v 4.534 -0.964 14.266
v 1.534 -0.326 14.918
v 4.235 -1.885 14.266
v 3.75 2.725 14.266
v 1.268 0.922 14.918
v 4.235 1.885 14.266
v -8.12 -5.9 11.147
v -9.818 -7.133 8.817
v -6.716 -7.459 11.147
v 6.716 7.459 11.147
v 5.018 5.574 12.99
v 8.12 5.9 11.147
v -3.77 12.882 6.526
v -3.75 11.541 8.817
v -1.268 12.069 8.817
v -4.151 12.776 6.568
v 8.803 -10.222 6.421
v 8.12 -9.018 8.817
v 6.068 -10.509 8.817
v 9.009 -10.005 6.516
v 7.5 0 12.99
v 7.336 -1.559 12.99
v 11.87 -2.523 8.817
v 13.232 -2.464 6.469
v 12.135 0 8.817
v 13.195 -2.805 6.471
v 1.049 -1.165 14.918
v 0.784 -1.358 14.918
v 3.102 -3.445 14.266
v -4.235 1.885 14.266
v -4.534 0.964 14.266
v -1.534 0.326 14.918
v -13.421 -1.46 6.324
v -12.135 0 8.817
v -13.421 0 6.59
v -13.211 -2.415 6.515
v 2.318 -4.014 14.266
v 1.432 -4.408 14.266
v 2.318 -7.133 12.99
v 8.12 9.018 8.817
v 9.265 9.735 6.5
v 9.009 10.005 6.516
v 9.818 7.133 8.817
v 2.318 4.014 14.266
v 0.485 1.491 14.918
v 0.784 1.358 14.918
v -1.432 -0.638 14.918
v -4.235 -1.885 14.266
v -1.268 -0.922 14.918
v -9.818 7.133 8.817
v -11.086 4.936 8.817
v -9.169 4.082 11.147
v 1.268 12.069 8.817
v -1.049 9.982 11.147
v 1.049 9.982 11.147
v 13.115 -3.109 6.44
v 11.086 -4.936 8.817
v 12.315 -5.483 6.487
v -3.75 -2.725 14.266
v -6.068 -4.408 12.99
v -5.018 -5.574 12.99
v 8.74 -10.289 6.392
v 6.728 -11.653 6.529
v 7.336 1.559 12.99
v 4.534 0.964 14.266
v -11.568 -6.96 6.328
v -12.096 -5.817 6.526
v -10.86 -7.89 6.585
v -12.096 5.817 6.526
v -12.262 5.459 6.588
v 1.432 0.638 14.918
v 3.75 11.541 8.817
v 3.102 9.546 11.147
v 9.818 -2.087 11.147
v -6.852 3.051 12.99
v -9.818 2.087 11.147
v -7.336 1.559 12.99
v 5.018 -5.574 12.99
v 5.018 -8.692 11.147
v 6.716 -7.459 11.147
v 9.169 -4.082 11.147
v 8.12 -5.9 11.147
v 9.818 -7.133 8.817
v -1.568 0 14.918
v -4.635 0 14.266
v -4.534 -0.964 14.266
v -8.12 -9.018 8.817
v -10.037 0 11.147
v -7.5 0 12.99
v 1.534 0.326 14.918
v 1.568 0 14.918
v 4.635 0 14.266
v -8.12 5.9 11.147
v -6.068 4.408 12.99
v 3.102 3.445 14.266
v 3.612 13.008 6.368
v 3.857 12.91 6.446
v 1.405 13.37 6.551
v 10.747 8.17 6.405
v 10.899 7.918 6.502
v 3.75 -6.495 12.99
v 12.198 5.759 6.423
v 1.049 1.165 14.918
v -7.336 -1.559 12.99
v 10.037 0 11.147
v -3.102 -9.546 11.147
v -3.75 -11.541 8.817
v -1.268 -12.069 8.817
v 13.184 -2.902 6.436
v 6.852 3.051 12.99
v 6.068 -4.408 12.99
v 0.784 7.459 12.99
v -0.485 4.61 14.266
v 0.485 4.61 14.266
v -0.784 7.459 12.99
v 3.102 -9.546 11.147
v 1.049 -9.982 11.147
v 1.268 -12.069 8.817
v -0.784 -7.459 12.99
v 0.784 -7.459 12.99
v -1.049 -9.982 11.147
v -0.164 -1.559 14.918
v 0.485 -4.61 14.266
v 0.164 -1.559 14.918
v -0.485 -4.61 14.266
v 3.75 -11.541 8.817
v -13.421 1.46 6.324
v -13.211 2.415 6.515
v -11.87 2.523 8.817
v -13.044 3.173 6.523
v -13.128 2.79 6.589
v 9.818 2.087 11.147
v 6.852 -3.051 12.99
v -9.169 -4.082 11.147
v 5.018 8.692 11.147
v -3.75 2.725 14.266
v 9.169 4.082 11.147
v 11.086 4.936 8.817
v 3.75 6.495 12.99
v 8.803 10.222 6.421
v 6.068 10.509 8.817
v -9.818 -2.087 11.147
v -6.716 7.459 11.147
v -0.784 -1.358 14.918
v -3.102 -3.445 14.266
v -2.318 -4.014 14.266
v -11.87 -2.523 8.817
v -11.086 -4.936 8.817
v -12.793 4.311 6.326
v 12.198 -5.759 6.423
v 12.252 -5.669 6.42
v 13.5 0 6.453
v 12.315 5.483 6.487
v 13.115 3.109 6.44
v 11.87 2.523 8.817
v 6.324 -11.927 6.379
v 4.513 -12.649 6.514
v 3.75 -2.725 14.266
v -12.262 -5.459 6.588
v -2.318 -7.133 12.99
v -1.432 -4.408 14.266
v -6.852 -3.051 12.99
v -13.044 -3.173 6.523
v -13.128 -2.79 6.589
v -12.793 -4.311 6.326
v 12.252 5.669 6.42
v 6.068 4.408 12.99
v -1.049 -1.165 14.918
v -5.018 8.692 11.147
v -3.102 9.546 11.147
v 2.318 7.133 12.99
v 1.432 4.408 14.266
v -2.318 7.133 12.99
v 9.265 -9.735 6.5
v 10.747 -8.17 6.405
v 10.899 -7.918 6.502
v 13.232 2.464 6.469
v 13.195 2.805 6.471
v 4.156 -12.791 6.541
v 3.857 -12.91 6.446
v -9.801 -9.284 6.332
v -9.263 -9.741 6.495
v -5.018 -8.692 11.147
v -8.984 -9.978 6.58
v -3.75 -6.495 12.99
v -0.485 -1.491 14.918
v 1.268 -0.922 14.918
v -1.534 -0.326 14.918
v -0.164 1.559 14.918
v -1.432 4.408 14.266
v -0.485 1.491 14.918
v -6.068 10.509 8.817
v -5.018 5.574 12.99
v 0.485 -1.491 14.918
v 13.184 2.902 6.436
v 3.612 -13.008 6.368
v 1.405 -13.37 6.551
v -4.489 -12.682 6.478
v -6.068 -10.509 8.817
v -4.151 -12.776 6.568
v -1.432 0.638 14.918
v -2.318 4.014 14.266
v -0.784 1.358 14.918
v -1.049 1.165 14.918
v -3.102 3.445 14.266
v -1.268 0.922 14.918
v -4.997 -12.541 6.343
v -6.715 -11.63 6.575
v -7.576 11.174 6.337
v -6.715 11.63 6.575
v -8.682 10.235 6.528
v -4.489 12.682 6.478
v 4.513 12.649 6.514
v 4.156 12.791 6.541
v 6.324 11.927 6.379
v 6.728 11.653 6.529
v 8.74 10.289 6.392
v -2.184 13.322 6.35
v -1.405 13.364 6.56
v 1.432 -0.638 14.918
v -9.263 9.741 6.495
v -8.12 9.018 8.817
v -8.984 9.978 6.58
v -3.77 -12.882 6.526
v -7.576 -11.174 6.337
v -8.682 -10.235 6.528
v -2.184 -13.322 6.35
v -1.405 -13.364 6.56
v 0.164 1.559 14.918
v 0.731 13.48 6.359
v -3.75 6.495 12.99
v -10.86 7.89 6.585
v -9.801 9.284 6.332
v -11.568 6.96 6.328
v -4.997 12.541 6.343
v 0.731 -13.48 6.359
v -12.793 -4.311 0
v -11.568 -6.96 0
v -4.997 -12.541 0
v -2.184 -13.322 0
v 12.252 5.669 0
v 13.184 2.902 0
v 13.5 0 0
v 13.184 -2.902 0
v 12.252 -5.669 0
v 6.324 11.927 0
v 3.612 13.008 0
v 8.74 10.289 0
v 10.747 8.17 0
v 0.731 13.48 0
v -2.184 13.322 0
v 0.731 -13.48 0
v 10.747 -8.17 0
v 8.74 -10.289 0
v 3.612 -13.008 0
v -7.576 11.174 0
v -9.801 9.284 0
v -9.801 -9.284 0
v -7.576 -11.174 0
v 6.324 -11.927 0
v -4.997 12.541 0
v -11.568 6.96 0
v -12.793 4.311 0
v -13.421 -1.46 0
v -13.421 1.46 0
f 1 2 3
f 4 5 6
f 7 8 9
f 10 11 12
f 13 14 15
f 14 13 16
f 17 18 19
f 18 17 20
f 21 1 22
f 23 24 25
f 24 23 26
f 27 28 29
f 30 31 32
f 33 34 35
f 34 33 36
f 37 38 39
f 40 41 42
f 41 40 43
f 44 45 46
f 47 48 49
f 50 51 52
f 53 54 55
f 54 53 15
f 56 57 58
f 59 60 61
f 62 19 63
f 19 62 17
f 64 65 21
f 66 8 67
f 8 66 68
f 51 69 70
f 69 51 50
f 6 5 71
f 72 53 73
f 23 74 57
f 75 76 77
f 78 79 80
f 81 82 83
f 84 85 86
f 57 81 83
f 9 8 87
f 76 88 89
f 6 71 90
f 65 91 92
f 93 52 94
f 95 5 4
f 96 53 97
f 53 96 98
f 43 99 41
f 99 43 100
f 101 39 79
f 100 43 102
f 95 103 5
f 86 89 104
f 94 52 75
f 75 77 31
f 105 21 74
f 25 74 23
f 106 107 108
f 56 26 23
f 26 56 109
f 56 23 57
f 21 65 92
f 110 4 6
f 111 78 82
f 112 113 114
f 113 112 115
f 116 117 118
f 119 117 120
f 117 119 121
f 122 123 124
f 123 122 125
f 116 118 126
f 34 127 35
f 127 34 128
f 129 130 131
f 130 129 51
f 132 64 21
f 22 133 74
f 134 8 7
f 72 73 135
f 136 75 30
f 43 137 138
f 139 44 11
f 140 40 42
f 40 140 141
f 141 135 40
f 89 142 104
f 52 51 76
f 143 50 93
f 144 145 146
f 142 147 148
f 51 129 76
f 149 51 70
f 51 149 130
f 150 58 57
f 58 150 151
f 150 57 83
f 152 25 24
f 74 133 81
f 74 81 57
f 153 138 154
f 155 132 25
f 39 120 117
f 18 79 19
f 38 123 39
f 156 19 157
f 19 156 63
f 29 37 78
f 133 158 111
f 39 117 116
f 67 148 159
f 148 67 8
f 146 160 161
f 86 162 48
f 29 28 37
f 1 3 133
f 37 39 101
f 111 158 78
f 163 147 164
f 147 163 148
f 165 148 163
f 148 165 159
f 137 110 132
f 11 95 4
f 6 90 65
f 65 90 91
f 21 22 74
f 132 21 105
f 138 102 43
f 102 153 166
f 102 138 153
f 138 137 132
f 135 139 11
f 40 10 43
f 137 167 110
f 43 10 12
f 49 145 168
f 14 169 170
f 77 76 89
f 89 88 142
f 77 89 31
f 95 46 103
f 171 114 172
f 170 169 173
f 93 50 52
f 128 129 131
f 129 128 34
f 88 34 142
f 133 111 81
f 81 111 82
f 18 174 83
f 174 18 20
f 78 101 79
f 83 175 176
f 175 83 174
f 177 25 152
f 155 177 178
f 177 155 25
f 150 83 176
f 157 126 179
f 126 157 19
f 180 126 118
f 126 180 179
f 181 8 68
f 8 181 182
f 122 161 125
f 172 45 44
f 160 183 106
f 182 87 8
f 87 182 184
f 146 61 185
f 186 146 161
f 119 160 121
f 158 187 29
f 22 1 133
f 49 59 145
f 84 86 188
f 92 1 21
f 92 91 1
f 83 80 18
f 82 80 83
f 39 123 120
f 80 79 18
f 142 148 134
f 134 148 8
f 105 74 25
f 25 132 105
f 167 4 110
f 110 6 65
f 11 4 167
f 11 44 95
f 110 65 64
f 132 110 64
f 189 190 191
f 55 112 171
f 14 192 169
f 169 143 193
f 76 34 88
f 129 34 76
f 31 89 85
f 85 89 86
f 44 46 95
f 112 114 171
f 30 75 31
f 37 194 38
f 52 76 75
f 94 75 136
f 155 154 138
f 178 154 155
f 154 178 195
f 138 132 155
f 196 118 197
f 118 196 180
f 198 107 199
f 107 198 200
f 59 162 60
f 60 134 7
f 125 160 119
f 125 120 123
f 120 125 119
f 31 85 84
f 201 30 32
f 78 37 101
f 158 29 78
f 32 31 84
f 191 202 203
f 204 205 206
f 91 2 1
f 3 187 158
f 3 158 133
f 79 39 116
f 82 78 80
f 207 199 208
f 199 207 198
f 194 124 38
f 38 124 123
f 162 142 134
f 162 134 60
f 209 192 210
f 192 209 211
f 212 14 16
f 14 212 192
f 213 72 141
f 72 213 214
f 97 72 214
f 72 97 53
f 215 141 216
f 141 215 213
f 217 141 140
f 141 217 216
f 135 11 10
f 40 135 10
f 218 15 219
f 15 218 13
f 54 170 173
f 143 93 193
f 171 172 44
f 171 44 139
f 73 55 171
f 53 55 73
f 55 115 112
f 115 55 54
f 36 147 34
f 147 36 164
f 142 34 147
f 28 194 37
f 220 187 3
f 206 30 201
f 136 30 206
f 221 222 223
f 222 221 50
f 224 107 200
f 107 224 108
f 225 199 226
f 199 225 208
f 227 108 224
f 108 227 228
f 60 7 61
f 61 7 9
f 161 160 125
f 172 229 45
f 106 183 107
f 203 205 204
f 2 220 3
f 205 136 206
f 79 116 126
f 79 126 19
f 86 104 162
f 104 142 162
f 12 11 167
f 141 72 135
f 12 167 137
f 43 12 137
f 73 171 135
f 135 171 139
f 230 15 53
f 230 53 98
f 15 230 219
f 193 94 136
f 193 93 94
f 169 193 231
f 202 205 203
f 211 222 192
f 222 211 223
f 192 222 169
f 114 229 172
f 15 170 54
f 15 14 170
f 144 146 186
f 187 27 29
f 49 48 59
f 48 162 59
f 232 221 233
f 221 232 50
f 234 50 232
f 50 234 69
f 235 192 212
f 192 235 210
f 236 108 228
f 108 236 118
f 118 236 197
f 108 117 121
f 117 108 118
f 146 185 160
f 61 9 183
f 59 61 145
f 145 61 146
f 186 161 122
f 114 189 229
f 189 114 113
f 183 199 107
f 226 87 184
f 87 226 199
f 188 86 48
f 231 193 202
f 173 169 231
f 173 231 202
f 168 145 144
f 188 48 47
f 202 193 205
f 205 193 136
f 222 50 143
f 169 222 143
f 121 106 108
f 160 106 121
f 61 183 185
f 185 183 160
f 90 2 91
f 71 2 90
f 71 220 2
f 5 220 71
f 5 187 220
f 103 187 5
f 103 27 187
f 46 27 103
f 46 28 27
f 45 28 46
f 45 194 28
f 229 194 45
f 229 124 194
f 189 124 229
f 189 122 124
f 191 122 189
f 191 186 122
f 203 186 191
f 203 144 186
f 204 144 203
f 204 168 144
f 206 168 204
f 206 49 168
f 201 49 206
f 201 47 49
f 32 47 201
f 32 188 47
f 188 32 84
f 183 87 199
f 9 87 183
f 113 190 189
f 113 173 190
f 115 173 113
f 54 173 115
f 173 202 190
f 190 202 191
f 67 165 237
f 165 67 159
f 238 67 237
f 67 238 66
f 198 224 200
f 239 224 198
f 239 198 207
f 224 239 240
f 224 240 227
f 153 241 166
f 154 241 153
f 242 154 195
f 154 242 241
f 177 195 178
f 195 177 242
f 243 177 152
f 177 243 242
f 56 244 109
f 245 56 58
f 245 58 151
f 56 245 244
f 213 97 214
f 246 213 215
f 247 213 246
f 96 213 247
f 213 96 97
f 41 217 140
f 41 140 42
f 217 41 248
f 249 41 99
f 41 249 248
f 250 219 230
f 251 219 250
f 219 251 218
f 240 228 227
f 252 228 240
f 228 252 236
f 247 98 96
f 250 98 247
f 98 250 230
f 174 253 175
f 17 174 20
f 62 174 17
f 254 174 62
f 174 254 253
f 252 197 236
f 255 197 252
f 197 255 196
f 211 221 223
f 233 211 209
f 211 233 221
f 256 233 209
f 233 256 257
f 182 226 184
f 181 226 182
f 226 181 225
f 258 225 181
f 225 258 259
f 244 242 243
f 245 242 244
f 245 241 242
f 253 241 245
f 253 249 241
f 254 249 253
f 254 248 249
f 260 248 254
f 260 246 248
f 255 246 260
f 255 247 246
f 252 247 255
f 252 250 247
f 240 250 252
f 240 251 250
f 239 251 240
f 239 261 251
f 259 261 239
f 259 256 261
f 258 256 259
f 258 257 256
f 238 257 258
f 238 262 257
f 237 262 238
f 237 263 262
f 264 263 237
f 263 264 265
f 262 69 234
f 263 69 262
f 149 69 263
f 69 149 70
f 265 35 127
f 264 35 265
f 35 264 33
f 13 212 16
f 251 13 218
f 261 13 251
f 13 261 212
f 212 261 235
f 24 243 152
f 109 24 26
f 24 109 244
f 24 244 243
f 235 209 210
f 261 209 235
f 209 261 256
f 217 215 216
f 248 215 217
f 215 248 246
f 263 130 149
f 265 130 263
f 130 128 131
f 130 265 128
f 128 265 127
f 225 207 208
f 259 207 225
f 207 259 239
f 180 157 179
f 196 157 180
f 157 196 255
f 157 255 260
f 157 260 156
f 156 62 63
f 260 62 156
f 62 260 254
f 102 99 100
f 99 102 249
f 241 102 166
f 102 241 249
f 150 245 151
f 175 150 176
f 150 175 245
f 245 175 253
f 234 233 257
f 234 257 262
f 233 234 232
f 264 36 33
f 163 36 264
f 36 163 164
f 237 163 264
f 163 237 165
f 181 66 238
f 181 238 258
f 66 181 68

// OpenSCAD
//Intersection is a useful way to combine two shapes. 
//Scale makes and object bigger or smaller.
// 1. Change the scale amount to be larger or smaller. Which number corresponds to the original size? 
// 2. Combine translations with different scale amounts to put a second dome on top of this (like on the U.S. Capitol Building). 



scale(1.5)
intersection(){
    sphere(r=10);
    cylinder(r=9,h=10);
}
